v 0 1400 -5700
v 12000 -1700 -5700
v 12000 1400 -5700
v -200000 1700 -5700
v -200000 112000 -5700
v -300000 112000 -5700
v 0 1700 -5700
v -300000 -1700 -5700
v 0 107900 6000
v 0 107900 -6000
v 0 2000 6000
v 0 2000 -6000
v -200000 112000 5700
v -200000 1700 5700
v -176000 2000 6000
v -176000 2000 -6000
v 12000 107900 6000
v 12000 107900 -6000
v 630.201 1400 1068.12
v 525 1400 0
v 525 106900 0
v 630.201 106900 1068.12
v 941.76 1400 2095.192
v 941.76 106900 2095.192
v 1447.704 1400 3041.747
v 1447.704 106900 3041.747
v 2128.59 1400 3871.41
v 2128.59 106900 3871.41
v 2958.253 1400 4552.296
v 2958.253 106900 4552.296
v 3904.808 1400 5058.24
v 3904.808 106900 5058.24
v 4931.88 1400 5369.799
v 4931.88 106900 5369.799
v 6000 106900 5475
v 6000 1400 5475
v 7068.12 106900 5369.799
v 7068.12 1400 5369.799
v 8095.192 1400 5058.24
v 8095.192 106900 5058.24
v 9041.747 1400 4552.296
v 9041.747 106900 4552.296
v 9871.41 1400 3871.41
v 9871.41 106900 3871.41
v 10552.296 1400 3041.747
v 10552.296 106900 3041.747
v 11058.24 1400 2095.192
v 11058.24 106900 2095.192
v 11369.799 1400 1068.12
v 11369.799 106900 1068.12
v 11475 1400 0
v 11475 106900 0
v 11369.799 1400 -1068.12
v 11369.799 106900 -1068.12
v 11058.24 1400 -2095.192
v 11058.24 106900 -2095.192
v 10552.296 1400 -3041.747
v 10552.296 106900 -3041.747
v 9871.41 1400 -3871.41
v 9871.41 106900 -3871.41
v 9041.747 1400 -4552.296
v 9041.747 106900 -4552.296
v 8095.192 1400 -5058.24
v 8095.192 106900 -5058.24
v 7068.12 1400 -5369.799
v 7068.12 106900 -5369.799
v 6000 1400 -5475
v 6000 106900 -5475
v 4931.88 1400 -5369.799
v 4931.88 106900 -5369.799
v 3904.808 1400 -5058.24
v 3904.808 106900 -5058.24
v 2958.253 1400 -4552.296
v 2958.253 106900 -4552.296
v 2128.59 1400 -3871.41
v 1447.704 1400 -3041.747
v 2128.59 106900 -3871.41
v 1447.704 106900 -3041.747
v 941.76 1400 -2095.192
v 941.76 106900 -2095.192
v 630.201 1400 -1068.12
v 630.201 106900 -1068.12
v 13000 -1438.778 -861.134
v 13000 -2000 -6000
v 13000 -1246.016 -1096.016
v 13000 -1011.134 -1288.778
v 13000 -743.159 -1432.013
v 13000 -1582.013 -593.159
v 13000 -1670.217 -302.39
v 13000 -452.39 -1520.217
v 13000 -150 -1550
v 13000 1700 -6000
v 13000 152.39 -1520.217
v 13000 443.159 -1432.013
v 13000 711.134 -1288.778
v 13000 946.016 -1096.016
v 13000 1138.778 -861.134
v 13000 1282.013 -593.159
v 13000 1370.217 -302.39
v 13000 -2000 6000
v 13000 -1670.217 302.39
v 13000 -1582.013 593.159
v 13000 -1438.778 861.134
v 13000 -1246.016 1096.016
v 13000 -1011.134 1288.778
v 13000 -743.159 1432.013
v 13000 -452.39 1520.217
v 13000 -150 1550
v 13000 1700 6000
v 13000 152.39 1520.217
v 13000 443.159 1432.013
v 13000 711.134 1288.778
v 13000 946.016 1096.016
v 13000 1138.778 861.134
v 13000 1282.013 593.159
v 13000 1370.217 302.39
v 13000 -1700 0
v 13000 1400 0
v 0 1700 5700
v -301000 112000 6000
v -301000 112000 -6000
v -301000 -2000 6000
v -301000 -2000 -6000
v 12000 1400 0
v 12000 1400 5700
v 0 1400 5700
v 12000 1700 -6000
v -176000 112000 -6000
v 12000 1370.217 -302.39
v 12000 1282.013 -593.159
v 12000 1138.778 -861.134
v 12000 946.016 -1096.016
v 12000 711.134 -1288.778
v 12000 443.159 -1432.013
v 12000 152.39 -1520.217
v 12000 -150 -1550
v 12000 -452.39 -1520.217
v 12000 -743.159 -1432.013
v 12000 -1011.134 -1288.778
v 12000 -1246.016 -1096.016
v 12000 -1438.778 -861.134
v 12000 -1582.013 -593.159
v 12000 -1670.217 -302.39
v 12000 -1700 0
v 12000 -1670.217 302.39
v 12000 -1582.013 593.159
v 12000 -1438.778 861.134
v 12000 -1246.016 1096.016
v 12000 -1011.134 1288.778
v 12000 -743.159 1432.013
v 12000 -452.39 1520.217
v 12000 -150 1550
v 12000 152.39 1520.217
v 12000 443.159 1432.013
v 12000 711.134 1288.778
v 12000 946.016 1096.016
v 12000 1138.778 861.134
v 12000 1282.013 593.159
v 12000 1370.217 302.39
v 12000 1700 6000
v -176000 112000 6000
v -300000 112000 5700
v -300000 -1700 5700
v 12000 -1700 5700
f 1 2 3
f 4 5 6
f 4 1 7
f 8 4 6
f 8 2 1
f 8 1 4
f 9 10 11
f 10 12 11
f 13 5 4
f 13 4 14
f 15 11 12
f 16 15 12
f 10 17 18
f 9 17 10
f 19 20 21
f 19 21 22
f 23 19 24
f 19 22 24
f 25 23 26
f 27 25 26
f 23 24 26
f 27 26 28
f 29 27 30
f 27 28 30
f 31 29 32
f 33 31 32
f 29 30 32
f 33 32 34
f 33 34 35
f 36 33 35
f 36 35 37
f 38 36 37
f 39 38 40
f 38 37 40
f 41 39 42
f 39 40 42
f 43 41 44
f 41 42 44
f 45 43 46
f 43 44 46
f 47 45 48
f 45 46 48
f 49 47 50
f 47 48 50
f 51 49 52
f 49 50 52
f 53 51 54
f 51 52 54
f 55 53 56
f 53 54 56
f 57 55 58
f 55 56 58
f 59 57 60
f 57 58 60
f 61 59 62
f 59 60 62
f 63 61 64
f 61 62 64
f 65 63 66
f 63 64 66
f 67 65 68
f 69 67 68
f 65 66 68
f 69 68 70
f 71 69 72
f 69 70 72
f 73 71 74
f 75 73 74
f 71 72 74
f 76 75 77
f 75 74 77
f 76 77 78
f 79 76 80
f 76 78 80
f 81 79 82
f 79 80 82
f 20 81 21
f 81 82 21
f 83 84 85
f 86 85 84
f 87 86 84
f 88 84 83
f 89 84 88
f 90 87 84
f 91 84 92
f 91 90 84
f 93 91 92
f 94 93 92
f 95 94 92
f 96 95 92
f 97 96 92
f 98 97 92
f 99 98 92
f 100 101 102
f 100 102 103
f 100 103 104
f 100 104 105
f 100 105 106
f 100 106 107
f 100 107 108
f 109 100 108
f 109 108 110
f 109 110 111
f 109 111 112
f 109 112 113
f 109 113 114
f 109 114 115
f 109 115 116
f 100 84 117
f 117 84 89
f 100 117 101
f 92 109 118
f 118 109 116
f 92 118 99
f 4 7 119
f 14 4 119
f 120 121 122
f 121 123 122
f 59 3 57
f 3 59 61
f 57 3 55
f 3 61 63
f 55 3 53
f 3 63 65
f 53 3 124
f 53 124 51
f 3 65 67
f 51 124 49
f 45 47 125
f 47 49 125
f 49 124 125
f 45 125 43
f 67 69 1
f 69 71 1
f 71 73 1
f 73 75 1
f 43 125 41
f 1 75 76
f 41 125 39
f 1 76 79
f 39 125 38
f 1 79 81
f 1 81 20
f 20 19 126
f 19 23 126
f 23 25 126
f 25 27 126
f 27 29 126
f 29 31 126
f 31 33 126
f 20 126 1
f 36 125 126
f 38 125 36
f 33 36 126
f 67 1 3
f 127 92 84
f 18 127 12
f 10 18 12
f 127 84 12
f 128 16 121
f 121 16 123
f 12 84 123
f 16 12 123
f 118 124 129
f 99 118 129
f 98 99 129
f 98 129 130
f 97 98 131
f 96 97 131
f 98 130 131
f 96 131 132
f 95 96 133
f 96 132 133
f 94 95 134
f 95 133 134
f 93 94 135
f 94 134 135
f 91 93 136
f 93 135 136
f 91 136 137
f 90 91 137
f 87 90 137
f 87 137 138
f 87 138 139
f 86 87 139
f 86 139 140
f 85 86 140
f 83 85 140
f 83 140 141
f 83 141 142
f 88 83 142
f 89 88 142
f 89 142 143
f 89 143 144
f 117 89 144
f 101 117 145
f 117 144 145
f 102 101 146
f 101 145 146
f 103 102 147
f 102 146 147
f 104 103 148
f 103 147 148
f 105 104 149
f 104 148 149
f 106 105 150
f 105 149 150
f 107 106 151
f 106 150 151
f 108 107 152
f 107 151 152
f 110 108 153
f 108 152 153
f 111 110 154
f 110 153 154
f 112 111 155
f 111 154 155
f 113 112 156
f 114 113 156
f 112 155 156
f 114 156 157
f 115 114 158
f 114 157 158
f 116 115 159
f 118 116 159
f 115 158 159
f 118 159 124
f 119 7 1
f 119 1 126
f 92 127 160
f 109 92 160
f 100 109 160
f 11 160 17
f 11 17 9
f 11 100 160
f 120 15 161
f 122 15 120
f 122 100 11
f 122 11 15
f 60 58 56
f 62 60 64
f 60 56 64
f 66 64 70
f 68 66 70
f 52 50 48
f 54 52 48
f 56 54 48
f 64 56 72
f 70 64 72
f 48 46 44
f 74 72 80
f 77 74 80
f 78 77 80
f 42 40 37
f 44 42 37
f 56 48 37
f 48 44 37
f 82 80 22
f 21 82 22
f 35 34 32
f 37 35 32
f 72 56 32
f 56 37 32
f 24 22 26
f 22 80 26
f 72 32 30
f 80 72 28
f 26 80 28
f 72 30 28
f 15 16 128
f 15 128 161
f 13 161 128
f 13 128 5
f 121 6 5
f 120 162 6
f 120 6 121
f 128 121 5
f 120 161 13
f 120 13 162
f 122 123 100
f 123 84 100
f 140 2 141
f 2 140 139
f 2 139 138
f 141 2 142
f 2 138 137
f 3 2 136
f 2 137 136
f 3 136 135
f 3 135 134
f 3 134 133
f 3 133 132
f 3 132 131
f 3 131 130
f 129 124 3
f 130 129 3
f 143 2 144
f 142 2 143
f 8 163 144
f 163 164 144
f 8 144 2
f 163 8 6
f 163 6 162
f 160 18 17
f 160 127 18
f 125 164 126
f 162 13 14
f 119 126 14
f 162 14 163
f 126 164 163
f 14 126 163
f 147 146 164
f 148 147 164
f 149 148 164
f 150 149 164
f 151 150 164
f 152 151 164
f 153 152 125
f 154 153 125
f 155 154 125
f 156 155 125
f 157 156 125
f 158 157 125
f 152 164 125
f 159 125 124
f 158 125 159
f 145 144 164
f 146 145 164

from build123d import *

# Parameters (mm, degrees)
F1_W      = 4000
F1_H      = 12000
F1_W_2    = 3400
F1_H_2    = 11400
F2_DEPTH  = 200000
F3_R      = 5475
F4_DEPTH  = 600
F5_DEPTH  = 105500
F6_DEPTH  = 12000
F8_DEPTH  = 1000
F12_W     = 12000
F12_H     = 12000
F12_R     = 5475
F13_DEPTH = 1000
F15_DEPTH = 100000
F16_W     = 3400
F16_H     = 11400
F17_DEPTH = 1000
F18_DEPTH = 300
F19_W     = 125000
F19_H     = 12000
F19_W_2   = 100000
F19_H_2   = 11400
F20_DEPTH = 110000


# Not quite as in the source:
# - the program builds the solid bodies; features that only make, move or delete a surface that nothing else refers to are left out


with BuildPart() as f2:
    # F1 (on face) → F2 (new body)
    with BuildSketch(Plane.YZ):
        Rectangle(F1_W, F1_H)
        Rectangle(F1_W_2, F1_H_2, mode=Mode.SUBTRACT)
    extrude(amount=-F2_DEPTH)

    # F3 (on face) → F4 (join)
    with BuildSketch(Plane(origin=(0, 2000, 0), x_dir=(-1, 0, 0), z_dir=(0, 1, 0))):
        with BuildLine():
            ThreePointArc((-6000, 6000), (-1757.3593128807, 4242.6406871193), (0, 0))
            Line((0, 0), (0, 6000))
            Line((0, 6000), (-6000, 6000))
        make_face()
        with BuildLine():
            ThreePointArc((-12000, 0), (-10242.6406871193, 4242.6406871193), (-6000, 6000))
            Line((-6000, 6000), (-12000, 6000))
            Line((-12000, 6000), (-12000, 0))
        make_face()
        with BuildLine():
            Line((-12000, -6000), (-6000, -6000))
            ThreePointArc((-6000, -6000), (-10242.6406871193, -4242.6406871193), (-12000, 0))
            Line((-12000, 0), (-12000, -6000))
        make_face()
        with BuildLine():
            Line((0, -6000), (0, 0))
            ThreePointArc((0, 0), (-1757.3593128807, -4242.6406871193), (-6000, -6000))
            Line((-6000, -6000), (0, -6000))
        make_face()
        with BuildLine():
            ThreePointArc((-6000, -6000), (-1757.3593128807, -4242.6406871193), (0, 0))
            ThreePointArc((0, 0), (-1757.3593128807, 4242.6406871193), (-6000, 6000))
            ThreePointArc((-6000, 6000), (-10242.6406871193, 4242.6406871193), (-12000, 0))
            ThreePointArc((-12000, 0), (-10242.6406871193, -4242.6406871193), (-6000, -6000))
        make_face()
        with Locations((-6000, 0)):
            Circle(F3_R, mode=Mode.SUBTRACT)
    extrude(amount=-F4_DEPTH)

    # F5 (add): a face of the model
    f5_faces = [f2.faces().sort_by_distance(p)[0] for p in [
        (6000, 1400, 5830.2943725152),
    ]]
    extrude(f5_faces, amount=-F5_DEPTH)

    # F6 (add): a face of the model
    f6_faces = [f2.faces().sort_by_distance(p)[0] for p in [
        (0, -300, -5875.2763053786),
    ]]
    extrude(f6_faces, amount=F6_DEPTH)

    # F7 (on face) → F8 (join)
    with BuildSketch(Plane.YZ.offset(12000)):
        with BuildLine():
            ThreePointArc((1400, 1009.9504938361), (1623.4147850968, 526.7826876426), (1700, 0))
            Line((1700, 0), (1700, 6000))
            Line((1700, 6000), (-2000, 6000))
            Line((-2000, 6000), (-2000, 0))
            ThreePointArc((-2000, 0), (-1923.4147850968, 526.7826876426), (-1700, 1009.9504938361))
            Line((-1700, 1009.9504938361), (-1700, 5700))
            Line((-1700, 5700), (1400, 5700))
            Line((1400, 5700), (1400, 1009.9504938361))
        make_face()
        with BuildLine():
            ThreePointArc((-1700, 1009.9504938361), (-150, 1850), (1400, 1009.9504938361))
            Line((1400, 1009.9504938361), (1400, 5700))
            Line((1400, 5700), (-1700, 5700))
            Line((-1700, 5700), (-1700, 1009.9504938361))
        make_face()
        with BuildLine():
            Line((1400, -5700), (1400, -1009.9504938361))
            ThreePointArc((1400, -1009.9504938361), (-150, -1850), (-1700, -1009.9504938361))
            Line((-1700, -1009.9504938361), (-1700, -5700))
            Line((-1700, -5700), (1400, -5700))
        make_face()
        with BuildLine():
            Line((1700, -6000), (1700, 0))
            ThreePointArc((1700, 0), (1623.4147850968, -526.7826876426), (1400, -1009.9504938361))
            Line((1400, -1009.9504938361), (1400, -5700))
            Line((1400, -5700), (-1700, -5700))
            Line((-1700, -5700), (-1700, -1009.9504938361))
            ThreePointArc((-1700, -1009.9504938361), (-1923.4147850968, -526.7826876426), (-2000, 0))
            Line((-2000, 0), (-2000, -6000))
            Line((-2000, -6000), (1700, -6000))
        make_face()
        with BuildLine():
            ThreePointArc((1400, -1009.9504938361), (1623.4147850968, -526.7826876426), (1700, 0))
            ThreePointArc((1700, 0), (1623.4147850968, 526.7826876426), (1400, 1009.9504938361))
            Line((1400, 1009.9504938361), (1400, 0))
            Line((1400, 0), (1400, -1009.9504938361))
        make_face()
        with BuildLine():
            Line((-1700, -3.9425e-06), (-1700, 1009.9504938361))
            ThreePointArc((-1700, 1009.9504938361), (-1923.4147850968, 526.7826876426), (-2000, 0))
            ThreePointArc((-2000, 0), (-1923.4147850968, -526.7826876426), (-1700, -1009.9504938361))
            Line((-1700, -1009.9504938361), (-1700, -3.9425e-06))
        make_face()
        with BuildLine():
            Line((1400, 0), (1400, 1009.9504938361))
            ThreePointArc((1400, 1009.9504938361), (-150, 1850), (-1700, 1009.9504938361))
            Line((-1700, 1009.9504938361), (-1700, -3.9425e-06))
            ThreePointArc((-1700, -3.9425e-06), (-150.0000019713, 1550), (1400, 0))
        make_face()
        with BuildLine():
            ThreePointArc((-1700, -1009.9504938361), (-150, -1850), (1400, -1009.9504938361))
            Line((1400, -1009.9504938361), (1400, 0))
            ThreePointArc((1400, 0), (-149.9999980287, -1550), (-1700, -3.9425e-06))
            Line((-1700, -3.9425e-06), (-1700, -1009.9504938361))
        make_face()
    extrude(amount=F8_DEPTH)

    # F12 (on face) → F13 (join)
    with BuildSketch(Plane(origin=(0, 106900, 0), x_dir=(-1, 0, 0), z_dir=(0, 1, 0))):
        with Locations((-6000, 0)):
            Rectangle(F12_W, F12_H)
        with Locations((-6000, 0)):
            Circle(F12_R, mode=Mode.SUBTRACT)
        with Locations((-6000, 0)):
            Circle(F12_R)
    extrude(amount=F13_DEPTH)

    # F14 (on face) → F15 (join)
    with BuildSketch(Plane(origin=(-200000, 0, 0), x_dir=(0, -1, 0), z_dir=(-1, 0, 0))):
        Polygon((-1700, 6000), (-1700, 5700), (1700, 5700), (1700, -5700), (-1700, -5700), (-1700, -6000), (2000, -6000), (2000, 6000), align=None)
    extrude(amount=F15_DEPTH)

    # F16 (on face) → F17 (join)
    with BuildSketch(Plane(origin=(-300000, 0, 0), x_dir=(0, -1, 0), z_dir=(-1, 0, 0))):
        Polygon((-1700, -5700), (-1700, -6000), (2000, -6000), (2000, 6000), (-1700, 6000), (-1700, 5700), (1700, 5700), (1700, -5700), align=None)
        Rectangle(F16_W, F16_H)
    extrude(amount=F17_DEPTH)

    # F18 (add): a face of the model
    f18_faces = [f2.faces().sort_by_distance(p)[0] for p in [
        (-250000, 1700, -5801.710373119),
    ]]
    extrude(f18_faces, amount=F18_DEPTH)

    # F19 (on face) → F20 (join)
    with BuildSketch(Plane(origin=(0, 2000, 0), x_dir=(-1, 0, 0), z_dir=(0, 1, 0))):
        with Locations((238500, 0)):
            Rectangle(F19_W, F19_H)
        with Locations((250000, 0)):
            Rectangle(F19_W_2, F19_H_2, mode=Mode.SUBTRACT)
    extrude(amount=F20_DEPTH)


solid = f2.part
